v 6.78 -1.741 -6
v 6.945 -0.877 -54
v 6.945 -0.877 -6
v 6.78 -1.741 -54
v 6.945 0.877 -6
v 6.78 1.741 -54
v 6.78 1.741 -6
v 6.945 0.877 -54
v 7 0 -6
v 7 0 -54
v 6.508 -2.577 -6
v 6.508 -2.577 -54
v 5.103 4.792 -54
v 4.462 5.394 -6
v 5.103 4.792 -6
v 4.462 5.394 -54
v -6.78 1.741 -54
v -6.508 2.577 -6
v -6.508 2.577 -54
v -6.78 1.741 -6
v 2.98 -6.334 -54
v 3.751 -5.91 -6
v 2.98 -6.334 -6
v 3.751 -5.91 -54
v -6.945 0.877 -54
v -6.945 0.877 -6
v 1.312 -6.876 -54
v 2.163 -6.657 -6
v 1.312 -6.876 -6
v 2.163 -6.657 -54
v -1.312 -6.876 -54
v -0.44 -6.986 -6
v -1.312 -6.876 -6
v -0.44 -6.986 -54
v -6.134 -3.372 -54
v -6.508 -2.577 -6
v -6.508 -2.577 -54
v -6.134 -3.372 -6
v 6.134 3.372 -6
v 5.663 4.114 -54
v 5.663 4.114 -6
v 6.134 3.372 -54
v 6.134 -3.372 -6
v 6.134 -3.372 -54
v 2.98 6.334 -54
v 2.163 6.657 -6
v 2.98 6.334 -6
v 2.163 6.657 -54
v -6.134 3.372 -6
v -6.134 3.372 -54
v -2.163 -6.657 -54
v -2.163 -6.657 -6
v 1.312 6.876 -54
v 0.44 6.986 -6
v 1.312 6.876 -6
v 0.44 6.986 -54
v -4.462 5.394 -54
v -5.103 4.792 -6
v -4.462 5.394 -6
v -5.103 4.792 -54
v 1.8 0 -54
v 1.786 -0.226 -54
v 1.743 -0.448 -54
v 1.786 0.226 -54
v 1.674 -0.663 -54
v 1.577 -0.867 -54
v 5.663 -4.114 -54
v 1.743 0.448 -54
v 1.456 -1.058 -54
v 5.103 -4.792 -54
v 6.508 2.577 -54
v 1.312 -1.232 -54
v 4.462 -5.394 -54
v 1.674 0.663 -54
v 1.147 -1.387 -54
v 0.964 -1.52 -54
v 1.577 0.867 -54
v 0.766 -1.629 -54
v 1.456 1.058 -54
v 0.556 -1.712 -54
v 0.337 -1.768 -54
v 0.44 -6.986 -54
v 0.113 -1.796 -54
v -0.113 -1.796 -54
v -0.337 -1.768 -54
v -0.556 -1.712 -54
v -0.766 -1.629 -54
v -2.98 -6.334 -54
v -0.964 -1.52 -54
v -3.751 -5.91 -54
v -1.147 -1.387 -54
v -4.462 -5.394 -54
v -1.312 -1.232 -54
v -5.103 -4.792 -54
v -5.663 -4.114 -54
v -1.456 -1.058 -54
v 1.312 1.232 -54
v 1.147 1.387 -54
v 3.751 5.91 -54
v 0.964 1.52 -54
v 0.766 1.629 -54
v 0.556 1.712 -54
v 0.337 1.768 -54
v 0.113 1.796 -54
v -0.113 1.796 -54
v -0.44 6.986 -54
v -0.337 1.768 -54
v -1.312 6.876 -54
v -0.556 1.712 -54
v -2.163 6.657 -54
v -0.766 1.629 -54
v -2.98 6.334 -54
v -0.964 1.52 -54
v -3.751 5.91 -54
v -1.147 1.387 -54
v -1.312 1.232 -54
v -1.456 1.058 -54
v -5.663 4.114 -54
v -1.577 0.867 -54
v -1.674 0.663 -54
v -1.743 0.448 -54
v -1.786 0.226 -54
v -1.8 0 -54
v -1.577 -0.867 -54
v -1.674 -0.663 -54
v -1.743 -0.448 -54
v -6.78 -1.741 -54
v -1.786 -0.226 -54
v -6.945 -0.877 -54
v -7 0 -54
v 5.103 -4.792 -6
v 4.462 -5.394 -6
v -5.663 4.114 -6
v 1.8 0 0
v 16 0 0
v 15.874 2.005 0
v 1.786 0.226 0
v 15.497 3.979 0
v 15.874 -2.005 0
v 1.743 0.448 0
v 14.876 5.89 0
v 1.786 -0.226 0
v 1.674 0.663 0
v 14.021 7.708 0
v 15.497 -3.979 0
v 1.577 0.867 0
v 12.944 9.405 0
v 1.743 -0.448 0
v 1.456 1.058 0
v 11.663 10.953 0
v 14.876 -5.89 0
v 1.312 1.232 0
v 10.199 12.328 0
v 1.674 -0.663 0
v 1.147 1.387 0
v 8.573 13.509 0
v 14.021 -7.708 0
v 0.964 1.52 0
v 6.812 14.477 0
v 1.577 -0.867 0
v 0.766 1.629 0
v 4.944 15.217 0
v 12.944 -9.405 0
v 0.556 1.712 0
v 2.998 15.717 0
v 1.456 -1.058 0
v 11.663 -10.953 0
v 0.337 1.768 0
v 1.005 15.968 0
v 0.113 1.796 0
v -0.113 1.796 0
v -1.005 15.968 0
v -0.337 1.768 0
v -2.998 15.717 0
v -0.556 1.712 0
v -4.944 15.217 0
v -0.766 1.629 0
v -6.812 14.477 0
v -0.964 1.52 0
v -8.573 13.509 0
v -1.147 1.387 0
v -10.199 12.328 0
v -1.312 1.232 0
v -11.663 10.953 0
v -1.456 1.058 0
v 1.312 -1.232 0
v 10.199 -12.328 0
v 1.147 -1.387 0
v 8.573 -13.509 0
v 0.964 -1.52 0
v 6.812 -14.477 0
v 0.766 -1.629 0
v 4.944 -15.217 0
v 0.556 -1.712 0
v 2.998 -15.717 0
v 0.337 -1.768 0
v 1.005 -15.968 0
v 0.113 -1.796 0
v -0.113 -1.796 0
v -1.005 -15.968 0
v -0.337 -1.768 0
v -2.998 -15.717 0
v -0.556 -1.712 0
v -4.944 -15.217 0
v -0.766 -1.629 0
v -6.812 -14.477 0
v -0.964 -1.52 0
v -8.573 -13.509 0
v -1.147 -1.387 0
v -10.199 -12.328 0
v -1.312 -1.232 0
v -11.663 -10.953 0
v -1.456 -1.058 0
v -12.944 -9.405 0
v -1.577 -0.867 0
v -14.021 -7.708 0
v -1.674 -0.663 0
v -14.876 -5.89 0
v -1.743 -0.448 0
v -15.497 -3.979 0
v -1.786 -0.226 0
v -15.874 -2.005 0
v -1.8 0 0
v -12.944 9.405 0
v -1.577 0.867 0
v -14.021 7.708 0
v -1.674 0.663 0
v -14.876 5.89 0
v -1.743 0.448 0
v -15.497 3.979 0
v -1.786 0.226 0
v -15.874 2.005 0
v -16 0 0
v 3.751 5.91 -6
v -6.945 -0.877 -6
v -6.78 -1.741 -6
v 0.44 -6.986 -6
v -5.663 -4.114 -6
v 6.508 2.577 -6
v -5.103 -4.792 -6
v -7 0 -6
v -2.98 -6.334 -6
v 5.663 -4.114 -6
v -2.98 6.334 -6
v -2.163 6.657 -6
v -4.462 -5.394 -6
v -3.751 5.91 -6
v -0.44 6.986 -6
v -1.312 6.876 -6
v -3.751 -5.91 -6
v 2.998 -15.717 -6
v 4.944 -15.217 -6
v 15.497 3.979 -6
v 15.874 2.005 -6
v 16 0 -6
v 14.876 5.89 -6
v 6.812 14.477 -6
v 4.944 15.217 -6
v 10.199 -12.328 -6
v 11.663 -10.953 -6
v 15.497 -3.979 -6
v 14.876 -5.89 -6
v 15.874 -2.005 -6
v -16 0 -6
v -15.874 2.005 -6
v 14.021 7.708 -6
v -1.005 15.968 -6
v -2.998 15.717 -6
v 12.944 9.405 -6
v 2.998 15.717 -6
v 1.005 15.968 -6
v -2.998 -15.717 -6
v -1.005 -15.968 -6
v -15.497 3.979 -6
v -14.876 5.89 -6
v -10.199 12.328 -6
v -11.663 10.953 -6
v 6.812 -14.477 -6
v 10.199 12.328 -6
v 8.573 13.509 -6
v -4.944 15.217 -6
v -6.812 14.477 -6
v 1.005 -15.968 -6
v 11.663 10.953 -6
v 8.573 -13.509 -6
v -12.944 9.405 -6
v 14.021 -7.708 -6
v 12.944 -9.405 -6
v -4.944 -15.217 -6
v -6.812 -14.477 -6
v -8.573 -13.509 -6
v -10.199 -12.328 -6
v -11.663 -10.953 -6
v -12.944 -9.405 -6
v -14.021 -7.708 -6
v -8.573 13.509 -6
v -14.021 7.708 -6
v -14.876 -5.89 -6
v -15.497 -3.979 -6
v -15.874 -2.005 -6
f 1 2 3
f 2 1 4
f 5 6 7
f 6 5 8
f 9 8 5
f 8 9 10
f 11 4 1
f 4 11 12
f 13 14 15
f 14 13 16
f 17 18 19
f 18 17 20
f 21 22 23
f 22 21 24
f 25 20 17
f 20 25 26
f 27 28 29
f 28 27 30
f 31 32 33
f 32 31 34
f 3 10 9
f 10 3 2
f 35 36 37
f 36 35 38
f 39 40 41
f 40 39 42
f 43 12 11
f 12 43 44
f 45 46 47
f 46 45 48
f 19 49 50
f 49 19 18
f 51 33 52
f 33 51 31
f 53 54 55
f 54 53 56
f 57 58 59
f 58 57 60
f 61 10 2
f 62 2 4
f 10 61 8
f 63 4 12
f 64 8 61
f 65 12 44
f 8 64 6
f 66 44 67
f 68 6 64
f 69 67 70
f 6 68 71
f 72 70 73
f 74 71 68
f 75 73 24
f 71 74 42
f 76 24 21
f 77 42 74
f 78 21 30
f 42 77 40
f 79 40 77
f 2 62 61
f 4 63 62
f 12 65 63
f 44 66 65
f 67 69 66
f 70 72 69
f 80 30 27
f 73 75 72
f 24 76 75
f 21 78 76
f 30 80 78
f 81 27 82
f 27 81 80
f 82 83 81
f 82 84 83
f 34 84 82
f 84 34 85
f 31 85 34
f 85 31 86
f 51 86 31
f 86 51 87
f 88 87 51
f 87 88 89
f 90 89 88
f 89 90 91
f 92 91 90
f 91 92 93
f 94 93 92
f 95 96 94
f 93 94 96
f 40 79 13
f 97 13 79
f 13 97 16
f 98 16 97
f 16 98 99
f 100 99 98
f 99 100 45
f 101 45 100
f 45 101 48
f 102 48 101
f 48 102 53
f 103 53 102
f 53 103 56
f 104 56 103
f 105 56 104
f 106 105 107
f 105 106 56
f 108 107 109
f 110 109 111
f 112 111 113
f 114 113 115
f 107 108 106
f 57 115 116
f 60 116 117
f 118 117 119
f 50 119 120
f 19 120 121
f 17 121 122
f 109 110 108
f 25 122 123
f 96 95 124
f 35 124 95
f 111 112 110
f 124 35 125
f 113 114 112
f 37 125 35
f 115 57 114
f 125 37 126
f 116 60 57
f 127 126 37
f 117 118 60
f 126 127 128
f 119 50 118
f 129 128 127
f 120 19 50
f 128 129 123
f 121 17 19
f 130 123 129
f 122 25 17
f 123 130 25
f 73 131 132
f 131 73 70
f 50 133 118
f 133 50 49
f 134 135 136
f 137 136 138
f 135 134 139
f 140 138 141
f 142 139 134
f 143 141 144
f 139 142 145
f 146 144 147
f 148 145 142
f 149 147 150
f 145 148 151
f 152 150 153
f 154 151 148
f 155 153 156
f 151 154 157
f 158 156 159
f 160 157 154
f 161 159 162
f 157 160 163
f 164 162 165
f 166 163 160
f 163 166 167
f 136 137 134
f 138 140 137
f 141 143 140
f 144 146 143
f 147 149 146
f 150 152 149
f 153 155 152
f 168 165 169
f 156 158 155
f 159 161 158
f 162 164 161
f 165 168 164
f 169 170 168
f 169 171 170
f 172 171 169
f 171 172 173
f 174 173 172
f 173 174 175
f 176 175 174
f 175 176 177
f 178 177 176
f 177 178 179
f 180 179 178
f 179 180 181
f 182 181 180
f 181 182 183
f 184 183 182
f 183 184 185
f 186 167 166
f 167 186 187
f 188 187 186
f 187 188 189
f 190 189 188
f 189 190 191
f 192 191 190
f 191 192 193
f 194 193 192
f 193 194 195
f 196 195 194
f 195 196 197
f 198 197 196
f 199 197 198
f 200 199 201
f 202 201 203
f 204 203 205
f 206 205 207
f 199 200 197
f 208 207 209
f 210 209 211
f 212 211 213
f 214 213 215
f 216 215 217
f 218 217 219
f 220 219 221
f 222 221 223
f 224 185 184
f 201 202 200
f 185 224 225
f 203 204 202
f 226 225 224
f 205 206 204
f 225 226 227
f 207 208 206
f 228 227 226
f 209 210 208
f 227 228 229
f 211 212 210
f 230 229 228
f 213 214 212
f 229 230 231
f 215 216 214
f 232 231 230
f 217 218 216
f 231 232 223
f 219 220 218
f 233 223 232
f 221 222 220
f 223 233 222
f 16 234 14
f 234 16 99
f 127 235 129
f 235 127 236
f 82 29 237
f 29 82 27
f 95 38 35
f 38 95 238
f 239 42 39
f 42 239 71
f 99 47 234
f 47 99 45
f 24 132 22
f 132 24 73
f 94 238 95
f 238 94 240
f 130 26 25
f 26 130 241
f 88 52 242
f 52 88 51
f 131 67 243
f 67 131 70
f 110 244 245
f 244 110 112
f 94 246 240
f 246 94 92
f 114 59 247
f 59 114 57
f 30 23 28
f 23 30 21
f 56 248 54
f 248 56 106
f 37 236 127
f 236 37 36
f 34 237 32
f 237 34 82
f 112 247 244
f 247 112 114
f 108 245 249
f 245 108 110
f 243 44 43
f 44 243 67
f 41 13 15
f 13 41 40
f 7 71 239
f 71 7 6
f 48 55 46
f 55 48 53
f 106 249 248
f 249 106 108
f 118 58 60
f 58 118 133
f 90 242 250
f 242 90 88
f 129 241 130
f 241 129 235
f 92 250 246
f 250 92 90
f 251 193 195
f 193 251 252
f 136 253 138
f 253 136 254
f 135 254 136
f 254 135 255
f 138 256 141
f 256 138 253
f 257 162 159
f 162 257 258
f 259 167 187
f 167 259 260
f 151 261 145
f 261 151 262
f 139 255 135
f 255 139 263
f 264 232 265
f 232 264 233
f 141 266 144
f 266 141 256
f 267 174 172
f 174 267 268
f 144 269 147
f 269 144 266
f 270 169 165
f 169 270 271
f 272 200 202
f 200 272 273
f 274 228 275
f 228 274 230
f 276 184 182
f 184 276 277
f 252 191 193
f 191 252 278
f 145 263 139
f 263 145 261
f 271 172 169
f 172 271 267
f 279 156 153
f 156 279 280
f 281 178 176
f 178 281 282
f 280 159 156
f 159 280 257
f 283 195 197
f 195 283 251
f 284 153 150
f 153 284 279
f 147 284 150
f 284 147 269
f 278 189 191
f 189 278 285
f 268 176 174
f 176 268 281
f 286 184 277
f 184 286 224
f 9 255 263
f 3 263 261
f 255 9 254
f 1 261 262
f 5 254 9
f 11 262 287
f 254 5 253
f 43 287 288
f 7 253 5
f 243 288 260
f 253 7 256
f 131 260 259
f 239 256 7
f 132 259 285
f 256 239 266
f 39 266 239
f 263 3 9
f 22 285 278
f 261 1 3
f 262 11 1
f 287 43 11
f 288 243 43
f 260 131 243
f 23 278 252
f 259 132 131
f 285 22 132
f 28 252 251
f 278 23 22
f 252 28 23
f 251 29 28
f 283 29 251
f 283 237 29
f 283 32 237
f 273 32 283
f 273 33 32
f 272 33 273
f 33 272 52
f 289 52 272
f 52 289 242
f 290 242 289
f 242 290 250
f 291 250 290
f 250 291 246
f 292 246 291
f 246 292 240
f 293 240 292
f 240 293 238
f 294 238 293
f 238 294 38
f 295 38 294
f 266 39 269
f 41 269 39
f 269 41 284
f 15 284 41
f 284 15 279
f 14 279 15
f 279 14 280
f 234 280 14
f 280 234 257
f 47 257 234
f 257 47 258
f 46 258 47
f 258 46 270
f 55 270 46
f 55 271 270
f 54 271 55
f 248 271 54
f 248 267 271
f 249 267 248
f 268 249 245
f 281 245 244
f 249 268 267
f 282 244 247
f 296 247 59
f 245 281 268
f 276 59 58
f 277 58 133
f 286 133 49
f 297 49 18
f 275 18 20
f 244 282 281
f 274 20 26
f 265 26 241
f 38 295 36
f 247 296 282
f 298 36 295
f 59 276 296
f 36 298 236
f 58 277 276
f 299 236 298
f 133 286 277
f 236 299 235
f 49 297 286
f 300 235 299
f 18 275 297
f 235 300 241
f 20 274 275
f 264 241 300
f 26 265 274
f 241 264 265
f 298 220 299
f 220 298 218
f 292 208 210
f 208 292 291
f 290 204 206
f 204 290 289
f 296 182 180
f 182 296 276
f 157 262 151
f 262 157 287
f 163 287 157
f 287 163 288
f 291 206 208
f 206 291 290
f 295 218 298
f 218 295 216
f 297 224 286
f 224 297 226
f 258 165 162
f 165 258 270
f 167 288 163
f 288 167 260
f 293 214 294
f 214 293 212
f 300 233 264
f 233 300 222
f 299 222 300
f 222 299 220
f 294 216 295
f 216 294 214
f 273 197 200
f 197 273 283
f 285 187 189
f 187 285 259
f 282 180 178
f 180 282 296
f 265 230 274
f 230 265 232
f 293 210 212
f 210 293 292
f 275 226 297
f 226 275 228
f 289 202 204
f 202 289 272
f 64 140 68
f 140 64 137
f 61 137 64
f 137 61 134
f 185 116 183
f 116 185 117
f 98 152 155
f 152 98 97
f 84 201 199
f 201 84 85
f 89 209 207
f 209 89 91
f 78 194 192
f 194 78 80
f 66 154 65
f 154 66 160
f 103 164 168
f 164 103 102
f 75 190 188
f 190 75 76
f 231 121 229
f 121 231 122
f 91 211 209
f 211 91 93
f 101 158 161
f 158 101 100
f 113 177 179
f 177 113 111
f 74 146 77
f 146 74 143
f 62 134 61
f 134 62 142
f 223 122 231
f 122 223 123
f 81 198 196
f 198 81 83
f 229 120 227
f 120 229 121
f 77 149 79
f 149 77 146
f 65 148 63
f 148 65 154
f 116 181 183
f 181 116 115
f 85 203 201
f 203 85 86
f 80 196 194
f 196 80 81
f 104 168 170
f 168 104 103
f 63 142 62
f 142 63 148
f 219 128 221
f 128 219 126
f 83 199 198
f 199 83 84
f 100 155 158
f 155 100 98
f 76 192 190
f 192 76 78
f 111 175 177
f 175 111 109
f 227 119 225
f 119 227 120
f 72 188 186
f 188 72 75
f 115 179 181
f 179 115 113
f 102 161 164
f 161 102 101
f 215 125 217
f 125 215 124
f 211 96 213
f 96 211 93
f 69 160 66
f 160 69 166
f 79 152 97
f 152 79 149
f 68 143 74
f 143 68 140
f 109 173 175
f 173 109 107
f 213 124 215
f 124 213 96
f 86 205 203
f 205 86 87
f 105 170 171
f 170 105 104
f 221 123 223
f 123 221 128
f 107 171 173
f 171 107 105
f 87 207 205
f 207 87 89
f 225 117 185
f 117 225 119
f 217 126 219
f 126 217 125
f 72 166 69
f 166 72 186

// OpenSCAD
$fn = 50;


difference() {
	union() {
		translate(v = [0, 0, -54.0000000000]) {
			cylinder(h = 54, r = 7.0000000000);
		}
		translate(v = [0, 0, -6.0000000000]) {
			cylinder(h = 6, r = 16.0000000000);
		}
	}
	union() {
		#translate(v = [0, 0, -54]) {
			cylinder(h = 54, r = 1.8000000000);
		}
	}
}
